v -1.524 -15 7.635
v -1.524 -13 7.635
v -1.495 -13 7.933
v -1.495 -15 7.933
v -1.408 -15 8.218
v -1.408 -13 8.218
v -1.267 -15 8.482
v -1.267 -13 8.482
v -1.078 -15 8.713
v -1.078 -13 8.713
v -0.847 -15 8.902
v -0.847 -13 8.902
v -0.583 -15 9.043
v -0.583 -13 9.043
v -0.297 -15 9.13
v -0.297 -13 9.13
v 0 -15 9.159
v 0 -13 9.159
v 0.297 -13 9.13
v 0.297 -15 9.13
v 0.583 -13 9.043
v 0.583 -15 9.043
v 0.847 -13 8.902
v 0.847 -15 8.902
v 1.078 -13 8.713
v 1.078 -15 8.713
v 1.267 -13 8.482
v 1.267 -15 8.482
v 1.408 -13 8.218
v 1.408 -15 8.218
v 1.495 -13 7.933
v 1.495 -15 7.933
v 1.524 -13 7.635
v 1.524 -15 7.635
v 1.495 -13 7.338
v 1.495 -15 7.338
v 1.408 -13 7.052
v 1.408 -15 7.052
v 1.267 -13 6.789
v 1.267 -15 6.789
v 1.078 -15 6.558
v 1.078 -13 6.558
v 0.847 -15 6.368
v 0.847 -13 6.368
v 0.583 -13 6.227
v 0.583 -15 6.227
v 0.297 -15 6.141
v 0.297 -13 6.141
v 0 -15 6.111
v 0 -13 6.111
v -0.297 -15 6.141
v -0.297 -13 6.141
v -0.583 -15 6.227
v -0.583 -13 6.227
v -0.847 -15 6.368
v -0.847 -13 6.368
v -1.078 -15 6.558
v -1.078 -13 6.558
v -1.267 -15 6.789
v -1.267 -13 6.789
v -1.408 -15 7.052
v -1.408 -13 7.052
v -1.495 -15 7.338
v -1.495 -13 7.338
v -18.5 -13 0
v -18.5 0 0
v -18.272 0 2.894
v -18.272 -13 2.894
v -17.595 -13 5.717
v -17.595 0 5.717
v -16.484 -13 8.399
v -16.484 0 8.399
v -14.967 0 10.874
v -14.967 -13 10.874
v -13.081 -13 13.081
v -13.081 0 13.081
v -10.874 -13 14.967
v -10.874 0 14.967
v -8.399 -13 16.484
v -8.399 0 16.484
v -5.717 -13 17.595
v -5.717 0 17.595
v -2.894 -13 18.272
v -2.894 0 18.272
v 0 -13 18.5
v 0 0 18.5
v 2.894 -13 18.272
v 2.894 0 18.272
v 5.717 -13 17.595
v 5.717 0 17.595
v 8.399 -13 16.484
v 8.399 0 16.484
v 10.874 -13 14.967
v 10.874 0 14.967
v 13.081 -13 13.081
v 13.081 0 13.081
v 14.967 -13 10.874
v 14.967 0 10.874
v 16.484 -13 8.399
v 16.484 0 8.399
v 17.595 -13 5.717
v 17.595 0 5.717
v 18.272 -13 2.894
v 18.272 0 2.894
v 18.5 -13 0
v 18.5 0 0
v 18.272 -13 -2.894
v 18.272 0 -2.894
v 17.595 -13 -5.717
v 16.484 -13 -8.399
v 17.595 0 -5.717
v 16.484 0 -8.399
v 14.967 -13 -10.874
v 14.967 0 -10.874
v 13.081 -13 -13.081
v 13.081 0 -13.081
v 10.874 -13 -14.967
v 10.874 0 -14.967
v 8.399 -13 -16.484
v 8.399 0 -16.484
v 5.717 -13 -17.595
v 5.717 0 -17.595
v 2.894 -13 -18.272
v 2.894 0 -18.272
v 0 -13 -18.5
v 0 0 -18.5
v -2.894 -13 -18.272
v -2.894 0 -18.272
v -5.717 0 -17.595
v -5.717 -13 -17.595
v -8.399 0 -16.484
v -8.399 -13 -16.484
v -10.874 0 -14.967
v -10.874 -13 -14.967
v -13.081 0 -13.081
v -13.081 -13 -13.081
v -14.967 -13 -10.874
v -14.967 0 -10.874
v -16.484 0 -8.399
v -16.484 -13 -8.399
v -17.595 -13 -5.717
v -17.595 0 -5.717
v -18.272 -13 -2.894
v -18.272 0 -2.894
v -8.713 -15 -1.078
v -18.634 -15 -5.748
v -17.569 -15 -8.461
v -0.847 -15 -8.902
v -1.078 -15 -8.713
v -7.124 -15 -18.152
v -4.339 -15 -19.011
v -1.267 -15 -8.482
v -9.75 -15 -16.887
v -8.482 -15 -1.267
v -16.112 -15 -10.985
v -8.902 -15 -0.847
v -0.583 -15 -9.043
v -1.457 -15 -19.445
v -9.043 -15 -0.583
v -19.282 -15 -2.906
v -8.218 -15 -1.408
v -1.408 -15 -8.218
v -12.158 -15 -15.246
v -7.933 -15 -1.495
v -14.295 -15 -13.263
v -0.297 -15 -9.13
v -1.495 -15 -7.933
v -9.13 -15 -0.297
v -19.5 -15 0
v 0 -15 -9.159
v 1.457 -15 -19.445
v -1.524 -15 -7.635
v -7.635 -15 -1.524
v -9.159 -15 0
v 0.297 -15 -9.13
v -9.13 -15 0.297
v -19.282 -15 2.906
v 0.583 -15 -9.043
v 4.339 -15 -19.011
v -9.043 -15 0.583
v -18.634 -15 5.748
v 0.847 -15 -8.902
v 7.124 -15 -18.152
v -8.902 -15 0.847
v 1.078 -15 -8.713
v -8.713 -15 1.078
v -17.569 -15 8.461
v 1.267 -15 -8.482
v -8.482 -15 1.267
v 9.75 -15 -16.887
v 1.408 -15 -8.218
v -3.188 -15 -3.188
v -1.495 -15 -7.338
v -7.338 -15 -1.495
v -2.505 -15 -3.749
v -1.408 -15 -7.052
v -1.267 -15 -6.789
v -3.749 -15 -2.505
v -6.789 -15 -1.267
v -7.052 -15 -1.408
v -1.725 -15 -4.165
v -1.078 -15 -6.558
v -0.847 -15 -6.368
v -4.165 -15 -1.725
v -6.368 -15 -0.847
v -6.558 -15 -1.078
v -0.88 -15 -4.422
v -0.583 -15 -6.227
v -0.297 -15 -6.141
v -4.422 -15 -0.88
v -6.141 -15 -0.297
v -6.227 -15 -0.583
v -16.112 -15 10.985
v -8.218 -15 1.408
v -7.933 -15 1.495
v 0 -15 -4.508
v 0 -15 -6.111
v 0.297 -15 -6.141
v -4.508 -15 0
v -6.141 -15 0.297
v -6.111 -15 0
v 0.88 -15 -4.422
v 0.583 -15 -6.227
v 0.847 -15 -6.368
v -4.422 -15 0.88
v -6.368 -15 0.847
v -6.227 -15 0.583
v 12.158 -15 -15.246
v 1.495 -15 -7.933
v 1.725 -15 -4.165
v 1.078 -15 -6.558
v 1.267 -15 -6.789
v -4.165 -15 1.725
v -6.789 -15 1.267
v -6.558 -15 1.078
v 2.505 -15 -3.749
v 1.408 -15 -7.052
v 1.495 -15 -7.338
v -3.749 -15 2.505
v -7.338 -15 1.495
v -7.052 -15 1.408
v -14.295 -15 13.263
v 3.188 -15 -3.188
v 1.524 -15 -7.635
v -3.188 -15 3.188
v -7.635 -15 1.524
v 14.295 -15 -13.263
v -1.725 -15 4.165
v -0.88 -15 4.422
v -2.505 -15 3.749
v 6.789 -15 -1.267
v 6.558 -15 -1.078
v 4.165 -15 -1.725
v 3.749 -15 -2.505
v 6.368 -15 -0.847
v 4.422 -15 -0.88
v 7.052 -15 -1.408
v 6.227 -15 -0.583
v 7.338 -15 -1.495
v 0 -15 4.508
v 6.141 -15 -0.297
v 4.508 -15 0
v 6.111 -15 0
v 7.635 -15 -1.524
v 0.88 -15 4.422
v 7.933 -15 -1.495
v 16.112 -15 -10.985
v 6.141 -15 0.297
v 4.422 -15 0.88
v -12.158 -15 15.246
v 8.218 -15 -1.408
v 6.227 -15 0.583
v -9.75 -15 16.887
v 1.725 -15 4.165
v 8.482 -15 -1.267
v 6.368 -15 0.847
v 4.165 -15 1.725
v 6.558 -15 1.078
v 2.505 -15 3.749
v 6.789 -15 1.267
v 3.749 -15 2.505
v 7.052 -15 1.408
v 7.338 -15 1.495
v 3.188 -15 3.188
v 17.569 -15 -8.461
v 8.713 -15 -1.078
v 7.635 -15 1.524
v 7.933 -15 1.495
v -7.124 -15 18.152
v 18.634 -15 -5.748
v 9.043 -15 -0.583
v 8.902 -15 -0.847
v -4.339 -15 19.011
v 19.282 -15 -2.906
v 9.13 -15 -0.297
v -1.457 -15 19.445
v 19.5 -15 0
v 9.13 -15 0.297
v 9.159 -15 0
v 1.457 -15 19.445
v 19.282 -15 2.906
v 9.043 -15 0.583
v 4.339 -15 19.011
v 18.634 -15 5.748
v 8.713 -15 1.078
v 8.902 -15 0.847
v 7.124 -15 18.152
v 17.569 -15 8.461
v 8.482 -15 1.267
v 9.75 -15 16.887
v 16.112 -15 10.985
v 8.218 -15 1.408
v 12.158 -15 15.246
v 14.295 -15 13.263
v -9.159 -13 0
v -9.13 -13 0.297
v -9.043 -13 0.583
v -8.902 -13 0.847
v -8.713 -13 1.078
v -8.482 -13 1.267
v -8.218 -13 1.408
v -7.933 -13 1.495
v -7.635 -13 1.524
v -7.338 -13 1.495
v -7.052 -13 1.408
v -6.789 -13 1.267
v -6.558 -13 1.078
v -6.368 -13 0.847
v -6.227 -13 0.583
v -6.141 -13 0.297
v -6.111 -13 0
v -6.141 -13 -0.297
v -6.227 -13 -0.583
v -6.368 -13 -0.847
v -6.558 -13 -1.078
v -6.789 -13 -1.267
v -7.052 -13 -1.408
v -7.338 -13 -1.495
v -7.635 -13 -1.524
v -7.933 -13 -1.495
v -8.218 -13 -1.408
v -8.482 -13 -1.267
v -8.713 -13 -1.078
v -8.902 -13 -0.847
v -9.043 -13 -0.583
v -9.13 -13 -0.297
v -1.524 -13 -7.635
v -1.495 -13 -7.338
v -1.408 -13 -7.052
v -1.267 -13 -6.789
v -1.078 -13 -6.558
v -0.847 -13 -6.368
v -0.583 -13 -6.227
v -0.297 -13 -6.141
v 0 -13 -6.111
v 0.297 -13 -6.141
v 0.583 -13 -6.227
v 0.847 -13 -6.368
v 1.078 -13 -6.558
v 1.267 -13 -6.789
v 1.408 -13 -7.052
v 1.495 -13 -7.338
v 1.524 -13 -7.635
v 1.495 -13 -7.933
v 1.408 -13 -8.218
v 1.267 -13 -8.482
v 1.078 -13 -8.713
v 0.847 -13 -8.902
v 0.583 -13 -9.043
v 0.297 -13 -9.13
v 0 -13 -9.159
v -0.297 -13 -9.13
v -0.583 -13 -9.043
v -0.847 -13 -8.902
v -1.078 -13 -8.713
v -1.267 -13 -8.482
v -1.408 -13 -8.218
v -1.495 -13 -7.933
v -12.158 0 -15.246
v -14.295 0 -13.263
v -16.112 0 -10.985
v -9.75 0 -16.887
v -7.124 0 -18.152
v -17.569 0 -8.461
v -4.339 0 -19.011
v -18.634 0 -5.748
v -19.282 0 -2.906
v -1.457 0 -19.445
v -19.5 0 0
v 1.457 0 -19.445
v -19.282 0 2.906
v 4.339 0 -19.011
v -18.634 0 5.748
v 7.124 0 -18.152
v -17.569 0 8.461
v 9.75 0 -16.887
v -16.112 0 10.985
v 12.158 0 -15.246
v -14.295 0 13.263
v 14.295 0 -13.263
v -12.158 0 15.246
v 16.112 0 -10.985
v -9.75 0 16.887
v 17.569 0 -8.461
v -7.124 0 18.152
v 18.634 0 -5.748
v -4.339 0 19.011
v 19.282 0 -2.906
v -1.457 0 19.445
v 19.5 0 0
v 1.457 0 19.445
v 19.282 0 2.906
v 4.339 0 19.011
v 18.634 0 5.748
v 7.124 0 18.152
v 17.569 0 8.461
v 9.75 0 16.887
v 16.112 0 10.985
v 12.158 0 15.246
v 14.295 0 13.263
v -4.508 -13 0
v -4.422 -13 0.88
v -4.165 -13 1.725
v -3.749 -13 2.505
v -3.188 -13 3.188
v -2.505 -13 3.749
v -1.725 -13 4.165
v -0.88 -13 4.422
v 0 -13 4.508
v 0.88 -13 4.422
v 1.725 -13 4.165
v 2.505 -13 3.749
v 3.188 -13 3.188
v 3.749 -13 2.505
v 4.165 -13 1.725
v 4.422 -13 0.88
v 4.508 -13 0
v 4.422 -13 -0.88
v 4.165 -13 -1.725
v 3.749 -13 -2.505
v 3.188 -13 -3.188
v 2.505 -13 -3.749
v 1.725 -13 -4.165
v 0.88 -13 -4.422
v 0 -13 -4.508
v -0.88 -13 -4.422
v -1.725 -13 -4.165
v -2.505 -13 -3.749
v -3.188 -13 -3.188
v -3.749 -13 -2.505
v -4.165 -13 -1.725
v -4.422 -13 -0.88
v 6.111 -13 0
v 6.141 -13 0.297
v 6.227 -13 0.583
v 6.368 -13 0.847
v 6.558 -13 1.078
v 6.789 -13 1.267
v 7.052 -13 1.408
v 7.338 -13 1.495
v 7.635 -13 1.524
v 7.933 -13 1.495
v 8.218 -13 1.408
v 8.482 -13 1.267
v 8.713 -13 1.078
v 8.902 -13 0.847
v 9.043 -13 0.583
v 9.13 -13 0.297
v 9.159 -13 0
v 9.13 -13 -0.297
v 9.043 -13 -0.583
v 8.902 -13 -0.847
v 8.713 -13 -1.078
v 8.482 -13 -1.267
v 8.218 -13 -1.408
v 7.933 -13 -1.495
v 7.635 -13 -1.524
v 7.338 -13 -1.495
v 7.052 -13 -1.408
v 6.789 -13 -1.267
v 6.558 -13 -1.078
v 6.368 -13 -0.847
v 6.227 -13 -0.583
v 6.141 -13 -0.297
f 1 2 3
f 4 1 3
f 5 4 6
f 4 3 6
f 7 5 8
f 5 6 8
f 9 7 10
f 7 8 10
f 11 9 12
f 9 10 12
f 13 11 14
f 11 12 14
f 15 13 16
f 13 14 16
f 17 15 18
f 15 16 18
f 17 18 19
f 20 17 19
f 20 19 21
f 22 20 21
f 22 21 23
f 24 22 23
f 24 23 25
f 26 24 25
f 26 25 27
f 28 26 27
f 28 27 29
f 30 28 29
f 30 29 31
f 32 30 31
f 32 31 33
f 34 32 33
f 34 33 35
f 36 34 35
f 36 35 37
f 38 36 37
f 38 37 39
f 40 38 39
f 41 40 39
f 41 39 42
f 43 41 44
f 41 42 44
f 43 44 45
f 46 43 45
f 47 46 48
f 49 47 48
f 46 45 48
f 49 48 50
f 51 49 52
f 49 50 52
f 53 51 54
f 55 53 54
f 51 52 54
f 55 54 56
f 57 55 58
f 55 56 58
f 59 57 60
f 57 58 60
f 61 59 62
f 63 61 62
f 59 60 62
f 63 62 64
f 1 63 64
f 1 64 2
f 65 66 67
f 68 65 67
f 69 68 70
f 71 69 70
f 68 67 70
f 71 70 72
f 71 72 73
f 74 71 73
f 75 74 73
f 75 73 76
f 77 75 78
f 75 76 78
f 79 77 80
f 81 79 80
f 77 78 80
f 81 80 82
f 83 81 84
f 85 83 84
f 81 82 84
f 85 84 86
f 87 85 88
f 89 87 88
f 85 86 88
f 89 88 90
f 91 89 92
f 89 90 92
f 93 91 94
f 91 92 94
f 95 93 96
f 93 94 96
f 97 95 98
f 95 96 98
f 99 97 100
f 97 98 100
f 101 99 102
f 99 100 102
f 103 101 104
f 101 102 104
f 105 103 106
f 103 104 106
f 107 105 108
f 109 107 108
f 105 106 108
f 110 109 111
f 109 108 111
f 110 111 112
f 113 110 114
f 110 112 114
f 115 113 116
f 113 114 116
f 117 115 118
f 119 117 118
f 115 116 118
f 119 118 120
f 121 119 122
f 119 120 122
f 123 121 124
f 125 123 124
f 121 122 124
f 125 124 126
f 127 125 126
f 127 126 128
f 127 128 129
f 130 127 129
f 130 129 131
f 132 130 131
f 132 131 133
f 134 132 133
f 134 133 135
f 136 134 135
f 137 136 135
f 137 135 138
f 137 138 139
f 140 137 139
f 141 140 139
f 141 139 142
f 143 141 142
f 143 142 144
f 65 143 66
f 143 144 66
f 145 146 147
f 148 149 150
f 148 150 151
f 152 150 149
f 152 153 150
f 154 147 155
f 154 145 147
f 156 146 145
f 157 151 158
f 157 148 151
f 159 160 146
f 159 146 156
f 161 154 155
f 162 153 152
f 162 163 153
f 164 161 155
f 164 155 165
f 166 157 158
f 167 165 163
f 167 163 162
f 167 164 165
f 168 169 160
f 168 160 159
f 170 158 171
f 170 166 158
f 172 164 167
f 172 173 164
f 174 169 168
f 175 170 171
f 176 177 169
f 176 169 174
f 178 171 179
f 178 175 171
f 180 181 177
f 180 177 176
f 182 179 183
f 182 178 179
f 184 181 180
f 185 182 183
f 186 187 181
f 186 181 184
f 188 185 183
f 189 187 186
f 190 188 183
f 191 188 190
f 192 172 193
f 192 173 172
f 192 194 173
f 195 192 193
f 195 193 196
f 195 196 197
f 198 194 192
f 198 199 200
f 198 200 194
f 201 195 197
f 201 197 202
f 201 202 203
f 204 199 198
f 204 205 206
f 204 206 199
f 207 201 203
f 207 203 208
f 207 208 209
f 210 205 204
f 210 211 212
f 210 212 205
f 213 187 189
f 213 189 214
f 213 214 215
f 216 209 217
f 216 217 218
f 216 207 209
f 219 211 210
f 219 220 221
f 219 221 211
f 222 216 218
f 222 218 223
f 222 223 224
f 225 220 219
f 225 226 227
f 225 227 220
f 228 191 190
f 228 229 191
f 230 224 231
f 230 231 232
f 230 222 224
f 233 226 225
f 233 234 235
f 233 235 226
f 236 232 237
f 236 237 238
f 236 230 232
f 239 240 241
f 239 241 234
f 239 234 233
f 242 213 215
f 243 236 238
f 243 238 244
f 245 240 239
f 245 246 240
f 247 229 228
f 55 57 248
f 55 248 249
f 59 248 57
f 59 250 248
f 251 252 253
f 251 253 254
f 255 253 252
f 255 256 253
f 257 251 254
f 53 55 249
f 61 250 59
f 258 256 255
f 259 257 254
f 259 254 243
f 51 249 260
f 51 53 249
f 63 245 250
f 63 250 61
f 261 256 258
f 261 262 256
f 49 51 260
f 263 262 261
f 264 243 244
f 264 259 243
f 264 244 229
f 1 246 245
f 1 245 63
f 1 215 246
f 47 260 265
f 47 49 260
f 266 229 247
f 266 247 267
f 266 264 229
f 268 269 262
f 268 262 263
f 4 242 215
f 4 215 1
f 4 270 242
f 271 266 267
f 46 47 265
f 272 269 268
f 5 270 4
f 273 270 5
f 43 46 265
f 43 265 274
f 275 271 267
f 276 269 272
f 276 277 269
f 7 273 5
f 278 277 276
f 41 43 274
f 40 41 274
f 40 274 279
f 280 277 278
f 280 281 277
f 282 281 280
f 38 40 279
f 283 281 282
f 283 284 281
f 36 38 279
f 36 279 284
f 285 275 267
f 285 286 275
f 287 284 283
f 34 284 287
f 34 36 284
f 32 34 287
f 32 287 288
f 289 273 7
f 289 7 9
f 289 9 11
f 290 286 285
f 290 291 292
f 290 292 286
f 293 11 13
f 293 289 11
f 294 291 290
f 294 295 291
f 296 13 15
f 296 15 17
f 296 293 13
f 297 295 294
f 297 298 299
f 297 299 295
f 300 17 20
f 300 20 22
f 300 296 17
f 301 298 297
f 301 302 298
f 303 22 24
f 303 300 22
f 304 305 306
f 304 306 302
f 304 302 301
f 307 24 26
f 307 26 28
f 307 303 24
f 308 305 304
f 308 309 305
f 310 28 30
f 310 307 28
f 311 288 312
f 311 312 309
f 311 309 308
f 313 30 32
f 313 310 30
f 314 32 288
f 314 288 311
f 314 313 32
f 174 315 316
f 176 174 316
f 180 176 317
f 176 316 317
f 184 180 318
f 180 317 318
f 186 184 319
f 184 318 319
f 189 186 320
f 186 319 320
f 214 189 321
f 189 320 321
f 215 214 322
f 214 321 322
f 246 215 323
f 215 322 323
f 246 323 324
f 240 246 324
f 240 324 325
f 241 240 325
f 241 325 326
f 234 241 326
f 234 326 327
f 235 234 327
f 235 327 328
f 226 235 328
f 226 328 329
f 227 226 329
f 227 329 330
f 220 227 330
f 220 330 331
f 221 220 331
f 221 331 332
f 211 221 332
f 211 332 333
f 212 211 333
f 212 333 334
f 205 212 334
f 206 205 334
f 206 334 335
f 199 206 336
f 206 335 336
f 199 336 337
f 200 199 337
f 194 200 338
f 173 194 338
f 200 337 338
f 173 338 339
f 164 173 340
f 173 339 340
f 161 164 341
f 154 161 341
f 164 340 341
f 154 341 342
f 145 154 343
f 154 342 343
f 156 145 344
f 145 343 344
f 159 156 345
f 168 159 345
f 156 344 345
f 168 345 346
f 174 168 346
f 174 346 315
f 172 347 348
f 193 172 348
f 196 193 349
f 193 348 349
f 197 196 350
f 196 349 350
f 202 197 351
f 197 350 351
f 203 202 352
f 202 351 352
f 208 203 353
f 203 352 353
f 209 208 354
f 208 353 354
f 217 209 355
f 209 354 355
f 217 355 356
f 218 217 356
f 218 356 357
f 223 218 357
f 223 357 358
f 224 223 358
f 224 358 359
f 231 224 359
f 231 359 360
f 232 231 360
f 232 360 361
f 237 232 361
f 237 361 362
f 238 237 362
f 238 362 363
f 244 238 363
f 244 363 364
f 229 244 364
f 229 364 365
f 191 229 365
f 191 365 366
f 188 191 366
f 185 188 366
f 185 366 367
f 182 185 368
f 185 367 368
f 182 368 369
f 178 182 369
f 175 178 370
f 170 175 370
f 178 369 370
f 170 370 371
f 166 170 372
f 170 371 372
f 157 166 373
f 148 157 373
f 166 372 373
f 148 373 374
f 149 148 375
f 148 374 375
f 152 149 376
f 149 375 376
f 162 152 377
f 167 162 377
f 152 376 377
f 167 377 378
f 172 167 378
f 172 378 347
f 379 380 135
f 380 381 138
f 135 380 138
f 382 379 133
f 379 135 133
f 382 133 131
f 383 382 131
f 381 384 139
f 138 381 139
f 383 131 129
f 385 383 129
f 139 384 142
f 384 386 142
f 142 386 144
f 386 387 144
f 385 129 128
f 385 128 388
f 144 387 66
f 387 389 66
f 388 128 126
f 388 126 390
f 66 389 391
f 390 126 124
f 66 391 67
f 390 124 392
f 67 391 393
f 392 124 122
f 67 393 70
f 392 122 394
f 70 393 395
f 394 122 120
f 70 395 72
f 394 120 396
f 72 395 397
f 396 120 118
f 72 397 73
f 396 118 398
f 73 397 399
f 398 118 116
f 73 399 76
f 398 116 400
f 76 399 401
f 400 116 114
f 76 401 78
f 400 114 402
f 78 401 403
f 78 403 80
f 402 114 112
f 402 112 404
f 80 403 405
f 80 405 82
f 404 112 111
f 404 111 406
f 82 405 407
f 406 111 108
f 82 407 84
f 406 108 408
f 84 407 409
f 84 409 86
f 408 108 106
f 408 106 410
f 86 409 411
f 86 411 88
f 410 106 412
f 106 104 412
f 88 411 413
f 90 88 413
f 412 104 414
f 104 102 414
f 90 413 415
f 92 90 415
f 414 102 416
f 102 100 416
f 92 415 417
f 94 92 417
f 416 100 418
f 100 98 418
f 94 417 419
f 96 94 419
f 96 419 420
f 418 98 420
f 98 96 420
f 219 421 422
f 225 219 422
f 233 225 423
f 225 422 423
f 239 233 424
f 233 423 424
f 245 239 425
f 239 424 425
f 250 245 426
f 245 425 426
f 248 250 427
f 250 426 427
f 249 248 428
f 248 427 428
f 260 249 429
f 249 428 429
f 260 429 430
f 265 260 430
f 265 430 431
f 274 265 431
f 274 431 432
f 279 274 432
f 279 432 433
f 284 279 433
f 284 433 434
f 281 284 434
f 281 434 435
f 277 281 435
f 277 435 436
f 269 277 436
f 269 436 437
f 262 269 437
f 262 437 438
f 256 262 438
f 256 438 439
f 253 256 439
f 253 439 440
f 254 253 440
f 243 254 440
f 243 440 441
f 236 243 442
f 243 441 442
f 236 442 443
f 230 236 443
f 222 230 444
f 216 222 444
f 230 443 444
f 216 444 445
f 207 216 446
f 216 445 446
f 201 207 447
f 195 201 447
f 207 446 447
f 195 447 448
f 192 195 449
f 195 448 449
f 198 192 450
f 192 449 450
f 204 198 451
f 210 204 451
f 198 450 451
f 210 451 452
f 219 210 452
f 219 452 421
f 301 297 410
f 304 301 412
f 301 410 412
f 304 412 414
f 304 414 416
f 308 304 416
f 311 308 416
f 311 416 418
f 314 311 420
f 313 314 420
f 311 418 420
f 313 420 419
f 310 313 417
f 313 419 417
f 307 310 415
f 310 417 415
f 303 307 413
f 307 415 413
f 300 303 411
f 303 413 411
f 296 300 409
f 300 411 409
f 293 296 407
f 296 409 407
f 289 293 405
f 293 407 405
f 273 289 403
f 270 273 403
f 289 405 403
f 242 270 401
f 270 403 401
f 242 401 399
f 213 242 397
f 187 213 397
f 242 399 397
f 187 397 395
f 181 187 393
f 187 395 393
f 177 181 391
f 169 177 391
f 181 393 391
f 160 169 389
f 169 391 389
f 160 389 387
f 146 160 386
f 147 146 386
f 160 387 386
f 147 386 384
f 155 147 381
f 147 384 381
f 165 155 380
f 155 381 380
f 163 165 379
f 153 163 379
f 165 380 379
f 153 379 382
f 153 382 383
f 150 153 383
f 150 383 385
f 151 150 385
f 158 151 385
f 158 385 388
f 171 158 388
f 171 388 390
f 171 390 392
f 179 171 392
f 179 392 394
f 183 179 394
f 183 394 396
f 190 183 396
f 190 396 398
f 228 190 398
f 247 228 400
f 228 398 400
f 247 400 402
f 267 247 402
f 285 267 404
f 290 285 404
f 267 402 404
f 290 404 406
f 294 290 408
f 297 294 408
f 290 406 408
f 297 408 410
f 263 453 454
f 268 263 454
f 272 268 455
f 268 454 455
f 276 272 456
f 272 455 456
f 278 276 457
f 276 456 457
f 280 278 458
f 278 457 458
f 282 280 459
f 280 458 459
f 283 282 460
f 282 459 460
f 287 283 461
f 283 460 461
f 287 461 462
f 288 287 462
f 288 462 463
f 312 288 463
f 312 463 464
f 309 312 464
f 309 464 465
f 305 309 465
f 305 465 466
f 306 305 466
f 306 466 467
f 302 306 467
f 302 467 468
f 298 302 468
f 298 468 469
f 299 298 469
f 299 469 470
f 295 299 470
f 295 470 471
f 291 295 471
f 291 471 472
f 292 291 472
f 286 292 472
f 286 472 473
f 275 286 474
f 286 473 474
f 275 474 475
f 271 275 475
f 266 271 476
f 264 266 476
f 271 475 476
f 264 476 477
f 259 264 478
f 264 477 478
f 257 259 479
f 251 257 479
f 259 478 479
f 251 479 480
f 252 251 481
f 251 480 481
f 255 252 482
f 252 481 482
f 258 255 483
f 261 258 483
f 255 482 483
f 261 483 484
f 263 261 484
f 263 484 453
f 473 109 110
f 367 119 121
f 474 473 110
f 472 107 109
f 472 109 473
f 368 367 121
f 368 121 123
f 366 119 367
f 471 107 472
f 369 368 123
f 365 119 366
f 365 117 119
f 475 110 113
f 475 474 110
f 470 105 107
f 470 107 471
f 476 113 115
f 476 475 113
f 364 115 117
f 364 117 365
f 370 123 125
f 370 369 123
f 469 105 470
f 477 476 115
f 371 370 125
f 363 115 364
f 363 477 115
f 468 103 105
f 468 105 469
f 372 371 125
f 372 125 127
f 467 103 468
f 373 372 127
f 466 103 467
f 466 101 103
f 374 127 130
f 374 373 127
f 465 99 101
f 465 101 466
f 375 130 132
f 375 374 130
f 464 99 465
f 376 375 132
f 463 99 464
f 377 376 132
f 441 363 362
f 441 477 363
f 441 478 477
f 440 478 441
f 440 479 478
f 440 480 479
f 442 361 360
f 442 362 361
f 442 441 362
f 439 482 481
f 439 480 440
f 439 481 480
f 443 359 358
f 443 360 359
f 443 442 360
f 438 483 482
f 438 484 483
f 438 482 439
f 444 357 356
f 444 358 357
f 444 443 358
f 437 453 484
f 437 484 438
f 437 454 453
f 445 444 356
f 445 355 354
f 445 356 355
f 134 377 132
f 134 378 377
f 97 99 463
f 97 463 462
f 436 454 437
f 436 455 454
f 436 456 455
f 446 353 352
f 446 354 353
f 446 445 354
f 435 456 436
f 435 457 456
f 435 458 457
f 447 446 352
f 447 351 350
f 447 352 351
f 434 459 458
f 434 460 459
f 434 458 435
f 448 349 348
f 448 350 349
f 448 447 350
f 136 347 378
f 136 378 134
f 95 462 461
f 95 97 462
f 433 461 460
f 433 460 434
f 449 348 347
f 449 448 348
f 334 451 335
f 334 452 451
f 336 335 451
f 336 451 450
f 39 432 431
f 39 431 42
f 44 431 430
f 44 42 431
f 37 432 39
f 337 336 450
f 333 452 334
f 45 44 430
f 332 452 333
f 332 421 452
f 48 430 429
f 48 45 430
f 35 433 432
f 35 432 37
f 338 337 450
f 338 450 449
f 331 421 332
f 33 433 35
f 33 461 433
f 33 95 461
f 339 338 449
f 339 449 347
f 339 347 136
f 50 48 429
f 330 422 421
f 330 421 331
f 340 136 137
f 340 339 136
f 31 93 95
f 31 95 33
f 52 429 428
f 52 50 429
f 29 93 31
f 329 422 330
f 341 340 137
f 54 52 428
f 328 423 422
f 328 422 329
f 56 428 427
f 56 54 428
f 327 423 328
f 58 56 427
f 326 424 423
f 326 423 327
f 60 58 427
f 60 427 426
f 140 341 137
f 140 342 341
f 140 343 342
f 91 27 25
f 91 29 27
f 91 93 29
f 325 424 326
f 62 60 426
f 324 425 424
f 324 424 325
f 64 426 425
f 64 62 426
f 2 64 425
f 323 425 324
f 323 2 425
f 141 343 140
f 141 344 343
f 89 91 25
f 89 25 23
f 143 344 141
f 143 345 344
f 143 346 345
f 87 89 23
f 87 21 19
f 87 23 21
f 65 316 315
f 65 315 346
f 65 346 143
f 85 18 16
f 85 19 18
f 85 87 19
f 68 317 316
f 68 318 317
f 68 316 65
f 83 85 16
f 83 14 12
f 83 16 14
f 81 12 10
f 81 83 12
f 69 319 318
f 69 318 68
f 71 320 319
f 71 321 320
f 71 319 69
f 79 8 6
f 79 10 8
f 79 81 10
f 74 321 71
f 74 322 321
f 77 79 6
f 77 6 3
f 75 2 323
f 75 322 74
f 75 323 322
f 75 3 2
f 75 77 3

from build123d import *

# Parameters (mm, degrees)
F0_R     = 19.5
F1_DEPTH = 15
F2_R     = 18.5
F3_DEPTH = 13
F4_R     = 4.5085
F4_R_2   = 1.524
F5_DEPTH = 2.001


with BuildPart() as f1:
    # F0 (on Front) → F1 (new body)
    with BuildSketch(Plane.XZ):
        Circle(F0_R)
    extrude(amount=F1_DEPTH)

    # F2 (on face) → F3 (cut)
    with BuildSketch(Plane(origin=(0, 0, 0), x_dir=(-1, 0, 0), z_dir=(0, 1, 0))):
        Circle(F2_R)
    extrude(amount=-F3_DEPTH, mode=Mode.SUBTRACT)

    # F4 (on face) → F5 (cut, through all)
    with BuildSketch(Plane(origin=(0, -13, 0), x_dir=(-1, 0, 0), z_dir=(0, 1, 0))):
        Circle(F4_R)
        with Locations((0, 7.63524)):
            Circle(F4_R_2)
        with Locations((-7.63524, 0)):
            Circle(F4_R_2)
        with Locations((0, -7.63524)):
            Circle(F4_R_2)
        with Locations((7.63524, 0)):
            Circle(F4_R_2)
    extrude(amount=-F5_DEPTH, mode=Mode.SUBTRACT)


solid = f1.part
